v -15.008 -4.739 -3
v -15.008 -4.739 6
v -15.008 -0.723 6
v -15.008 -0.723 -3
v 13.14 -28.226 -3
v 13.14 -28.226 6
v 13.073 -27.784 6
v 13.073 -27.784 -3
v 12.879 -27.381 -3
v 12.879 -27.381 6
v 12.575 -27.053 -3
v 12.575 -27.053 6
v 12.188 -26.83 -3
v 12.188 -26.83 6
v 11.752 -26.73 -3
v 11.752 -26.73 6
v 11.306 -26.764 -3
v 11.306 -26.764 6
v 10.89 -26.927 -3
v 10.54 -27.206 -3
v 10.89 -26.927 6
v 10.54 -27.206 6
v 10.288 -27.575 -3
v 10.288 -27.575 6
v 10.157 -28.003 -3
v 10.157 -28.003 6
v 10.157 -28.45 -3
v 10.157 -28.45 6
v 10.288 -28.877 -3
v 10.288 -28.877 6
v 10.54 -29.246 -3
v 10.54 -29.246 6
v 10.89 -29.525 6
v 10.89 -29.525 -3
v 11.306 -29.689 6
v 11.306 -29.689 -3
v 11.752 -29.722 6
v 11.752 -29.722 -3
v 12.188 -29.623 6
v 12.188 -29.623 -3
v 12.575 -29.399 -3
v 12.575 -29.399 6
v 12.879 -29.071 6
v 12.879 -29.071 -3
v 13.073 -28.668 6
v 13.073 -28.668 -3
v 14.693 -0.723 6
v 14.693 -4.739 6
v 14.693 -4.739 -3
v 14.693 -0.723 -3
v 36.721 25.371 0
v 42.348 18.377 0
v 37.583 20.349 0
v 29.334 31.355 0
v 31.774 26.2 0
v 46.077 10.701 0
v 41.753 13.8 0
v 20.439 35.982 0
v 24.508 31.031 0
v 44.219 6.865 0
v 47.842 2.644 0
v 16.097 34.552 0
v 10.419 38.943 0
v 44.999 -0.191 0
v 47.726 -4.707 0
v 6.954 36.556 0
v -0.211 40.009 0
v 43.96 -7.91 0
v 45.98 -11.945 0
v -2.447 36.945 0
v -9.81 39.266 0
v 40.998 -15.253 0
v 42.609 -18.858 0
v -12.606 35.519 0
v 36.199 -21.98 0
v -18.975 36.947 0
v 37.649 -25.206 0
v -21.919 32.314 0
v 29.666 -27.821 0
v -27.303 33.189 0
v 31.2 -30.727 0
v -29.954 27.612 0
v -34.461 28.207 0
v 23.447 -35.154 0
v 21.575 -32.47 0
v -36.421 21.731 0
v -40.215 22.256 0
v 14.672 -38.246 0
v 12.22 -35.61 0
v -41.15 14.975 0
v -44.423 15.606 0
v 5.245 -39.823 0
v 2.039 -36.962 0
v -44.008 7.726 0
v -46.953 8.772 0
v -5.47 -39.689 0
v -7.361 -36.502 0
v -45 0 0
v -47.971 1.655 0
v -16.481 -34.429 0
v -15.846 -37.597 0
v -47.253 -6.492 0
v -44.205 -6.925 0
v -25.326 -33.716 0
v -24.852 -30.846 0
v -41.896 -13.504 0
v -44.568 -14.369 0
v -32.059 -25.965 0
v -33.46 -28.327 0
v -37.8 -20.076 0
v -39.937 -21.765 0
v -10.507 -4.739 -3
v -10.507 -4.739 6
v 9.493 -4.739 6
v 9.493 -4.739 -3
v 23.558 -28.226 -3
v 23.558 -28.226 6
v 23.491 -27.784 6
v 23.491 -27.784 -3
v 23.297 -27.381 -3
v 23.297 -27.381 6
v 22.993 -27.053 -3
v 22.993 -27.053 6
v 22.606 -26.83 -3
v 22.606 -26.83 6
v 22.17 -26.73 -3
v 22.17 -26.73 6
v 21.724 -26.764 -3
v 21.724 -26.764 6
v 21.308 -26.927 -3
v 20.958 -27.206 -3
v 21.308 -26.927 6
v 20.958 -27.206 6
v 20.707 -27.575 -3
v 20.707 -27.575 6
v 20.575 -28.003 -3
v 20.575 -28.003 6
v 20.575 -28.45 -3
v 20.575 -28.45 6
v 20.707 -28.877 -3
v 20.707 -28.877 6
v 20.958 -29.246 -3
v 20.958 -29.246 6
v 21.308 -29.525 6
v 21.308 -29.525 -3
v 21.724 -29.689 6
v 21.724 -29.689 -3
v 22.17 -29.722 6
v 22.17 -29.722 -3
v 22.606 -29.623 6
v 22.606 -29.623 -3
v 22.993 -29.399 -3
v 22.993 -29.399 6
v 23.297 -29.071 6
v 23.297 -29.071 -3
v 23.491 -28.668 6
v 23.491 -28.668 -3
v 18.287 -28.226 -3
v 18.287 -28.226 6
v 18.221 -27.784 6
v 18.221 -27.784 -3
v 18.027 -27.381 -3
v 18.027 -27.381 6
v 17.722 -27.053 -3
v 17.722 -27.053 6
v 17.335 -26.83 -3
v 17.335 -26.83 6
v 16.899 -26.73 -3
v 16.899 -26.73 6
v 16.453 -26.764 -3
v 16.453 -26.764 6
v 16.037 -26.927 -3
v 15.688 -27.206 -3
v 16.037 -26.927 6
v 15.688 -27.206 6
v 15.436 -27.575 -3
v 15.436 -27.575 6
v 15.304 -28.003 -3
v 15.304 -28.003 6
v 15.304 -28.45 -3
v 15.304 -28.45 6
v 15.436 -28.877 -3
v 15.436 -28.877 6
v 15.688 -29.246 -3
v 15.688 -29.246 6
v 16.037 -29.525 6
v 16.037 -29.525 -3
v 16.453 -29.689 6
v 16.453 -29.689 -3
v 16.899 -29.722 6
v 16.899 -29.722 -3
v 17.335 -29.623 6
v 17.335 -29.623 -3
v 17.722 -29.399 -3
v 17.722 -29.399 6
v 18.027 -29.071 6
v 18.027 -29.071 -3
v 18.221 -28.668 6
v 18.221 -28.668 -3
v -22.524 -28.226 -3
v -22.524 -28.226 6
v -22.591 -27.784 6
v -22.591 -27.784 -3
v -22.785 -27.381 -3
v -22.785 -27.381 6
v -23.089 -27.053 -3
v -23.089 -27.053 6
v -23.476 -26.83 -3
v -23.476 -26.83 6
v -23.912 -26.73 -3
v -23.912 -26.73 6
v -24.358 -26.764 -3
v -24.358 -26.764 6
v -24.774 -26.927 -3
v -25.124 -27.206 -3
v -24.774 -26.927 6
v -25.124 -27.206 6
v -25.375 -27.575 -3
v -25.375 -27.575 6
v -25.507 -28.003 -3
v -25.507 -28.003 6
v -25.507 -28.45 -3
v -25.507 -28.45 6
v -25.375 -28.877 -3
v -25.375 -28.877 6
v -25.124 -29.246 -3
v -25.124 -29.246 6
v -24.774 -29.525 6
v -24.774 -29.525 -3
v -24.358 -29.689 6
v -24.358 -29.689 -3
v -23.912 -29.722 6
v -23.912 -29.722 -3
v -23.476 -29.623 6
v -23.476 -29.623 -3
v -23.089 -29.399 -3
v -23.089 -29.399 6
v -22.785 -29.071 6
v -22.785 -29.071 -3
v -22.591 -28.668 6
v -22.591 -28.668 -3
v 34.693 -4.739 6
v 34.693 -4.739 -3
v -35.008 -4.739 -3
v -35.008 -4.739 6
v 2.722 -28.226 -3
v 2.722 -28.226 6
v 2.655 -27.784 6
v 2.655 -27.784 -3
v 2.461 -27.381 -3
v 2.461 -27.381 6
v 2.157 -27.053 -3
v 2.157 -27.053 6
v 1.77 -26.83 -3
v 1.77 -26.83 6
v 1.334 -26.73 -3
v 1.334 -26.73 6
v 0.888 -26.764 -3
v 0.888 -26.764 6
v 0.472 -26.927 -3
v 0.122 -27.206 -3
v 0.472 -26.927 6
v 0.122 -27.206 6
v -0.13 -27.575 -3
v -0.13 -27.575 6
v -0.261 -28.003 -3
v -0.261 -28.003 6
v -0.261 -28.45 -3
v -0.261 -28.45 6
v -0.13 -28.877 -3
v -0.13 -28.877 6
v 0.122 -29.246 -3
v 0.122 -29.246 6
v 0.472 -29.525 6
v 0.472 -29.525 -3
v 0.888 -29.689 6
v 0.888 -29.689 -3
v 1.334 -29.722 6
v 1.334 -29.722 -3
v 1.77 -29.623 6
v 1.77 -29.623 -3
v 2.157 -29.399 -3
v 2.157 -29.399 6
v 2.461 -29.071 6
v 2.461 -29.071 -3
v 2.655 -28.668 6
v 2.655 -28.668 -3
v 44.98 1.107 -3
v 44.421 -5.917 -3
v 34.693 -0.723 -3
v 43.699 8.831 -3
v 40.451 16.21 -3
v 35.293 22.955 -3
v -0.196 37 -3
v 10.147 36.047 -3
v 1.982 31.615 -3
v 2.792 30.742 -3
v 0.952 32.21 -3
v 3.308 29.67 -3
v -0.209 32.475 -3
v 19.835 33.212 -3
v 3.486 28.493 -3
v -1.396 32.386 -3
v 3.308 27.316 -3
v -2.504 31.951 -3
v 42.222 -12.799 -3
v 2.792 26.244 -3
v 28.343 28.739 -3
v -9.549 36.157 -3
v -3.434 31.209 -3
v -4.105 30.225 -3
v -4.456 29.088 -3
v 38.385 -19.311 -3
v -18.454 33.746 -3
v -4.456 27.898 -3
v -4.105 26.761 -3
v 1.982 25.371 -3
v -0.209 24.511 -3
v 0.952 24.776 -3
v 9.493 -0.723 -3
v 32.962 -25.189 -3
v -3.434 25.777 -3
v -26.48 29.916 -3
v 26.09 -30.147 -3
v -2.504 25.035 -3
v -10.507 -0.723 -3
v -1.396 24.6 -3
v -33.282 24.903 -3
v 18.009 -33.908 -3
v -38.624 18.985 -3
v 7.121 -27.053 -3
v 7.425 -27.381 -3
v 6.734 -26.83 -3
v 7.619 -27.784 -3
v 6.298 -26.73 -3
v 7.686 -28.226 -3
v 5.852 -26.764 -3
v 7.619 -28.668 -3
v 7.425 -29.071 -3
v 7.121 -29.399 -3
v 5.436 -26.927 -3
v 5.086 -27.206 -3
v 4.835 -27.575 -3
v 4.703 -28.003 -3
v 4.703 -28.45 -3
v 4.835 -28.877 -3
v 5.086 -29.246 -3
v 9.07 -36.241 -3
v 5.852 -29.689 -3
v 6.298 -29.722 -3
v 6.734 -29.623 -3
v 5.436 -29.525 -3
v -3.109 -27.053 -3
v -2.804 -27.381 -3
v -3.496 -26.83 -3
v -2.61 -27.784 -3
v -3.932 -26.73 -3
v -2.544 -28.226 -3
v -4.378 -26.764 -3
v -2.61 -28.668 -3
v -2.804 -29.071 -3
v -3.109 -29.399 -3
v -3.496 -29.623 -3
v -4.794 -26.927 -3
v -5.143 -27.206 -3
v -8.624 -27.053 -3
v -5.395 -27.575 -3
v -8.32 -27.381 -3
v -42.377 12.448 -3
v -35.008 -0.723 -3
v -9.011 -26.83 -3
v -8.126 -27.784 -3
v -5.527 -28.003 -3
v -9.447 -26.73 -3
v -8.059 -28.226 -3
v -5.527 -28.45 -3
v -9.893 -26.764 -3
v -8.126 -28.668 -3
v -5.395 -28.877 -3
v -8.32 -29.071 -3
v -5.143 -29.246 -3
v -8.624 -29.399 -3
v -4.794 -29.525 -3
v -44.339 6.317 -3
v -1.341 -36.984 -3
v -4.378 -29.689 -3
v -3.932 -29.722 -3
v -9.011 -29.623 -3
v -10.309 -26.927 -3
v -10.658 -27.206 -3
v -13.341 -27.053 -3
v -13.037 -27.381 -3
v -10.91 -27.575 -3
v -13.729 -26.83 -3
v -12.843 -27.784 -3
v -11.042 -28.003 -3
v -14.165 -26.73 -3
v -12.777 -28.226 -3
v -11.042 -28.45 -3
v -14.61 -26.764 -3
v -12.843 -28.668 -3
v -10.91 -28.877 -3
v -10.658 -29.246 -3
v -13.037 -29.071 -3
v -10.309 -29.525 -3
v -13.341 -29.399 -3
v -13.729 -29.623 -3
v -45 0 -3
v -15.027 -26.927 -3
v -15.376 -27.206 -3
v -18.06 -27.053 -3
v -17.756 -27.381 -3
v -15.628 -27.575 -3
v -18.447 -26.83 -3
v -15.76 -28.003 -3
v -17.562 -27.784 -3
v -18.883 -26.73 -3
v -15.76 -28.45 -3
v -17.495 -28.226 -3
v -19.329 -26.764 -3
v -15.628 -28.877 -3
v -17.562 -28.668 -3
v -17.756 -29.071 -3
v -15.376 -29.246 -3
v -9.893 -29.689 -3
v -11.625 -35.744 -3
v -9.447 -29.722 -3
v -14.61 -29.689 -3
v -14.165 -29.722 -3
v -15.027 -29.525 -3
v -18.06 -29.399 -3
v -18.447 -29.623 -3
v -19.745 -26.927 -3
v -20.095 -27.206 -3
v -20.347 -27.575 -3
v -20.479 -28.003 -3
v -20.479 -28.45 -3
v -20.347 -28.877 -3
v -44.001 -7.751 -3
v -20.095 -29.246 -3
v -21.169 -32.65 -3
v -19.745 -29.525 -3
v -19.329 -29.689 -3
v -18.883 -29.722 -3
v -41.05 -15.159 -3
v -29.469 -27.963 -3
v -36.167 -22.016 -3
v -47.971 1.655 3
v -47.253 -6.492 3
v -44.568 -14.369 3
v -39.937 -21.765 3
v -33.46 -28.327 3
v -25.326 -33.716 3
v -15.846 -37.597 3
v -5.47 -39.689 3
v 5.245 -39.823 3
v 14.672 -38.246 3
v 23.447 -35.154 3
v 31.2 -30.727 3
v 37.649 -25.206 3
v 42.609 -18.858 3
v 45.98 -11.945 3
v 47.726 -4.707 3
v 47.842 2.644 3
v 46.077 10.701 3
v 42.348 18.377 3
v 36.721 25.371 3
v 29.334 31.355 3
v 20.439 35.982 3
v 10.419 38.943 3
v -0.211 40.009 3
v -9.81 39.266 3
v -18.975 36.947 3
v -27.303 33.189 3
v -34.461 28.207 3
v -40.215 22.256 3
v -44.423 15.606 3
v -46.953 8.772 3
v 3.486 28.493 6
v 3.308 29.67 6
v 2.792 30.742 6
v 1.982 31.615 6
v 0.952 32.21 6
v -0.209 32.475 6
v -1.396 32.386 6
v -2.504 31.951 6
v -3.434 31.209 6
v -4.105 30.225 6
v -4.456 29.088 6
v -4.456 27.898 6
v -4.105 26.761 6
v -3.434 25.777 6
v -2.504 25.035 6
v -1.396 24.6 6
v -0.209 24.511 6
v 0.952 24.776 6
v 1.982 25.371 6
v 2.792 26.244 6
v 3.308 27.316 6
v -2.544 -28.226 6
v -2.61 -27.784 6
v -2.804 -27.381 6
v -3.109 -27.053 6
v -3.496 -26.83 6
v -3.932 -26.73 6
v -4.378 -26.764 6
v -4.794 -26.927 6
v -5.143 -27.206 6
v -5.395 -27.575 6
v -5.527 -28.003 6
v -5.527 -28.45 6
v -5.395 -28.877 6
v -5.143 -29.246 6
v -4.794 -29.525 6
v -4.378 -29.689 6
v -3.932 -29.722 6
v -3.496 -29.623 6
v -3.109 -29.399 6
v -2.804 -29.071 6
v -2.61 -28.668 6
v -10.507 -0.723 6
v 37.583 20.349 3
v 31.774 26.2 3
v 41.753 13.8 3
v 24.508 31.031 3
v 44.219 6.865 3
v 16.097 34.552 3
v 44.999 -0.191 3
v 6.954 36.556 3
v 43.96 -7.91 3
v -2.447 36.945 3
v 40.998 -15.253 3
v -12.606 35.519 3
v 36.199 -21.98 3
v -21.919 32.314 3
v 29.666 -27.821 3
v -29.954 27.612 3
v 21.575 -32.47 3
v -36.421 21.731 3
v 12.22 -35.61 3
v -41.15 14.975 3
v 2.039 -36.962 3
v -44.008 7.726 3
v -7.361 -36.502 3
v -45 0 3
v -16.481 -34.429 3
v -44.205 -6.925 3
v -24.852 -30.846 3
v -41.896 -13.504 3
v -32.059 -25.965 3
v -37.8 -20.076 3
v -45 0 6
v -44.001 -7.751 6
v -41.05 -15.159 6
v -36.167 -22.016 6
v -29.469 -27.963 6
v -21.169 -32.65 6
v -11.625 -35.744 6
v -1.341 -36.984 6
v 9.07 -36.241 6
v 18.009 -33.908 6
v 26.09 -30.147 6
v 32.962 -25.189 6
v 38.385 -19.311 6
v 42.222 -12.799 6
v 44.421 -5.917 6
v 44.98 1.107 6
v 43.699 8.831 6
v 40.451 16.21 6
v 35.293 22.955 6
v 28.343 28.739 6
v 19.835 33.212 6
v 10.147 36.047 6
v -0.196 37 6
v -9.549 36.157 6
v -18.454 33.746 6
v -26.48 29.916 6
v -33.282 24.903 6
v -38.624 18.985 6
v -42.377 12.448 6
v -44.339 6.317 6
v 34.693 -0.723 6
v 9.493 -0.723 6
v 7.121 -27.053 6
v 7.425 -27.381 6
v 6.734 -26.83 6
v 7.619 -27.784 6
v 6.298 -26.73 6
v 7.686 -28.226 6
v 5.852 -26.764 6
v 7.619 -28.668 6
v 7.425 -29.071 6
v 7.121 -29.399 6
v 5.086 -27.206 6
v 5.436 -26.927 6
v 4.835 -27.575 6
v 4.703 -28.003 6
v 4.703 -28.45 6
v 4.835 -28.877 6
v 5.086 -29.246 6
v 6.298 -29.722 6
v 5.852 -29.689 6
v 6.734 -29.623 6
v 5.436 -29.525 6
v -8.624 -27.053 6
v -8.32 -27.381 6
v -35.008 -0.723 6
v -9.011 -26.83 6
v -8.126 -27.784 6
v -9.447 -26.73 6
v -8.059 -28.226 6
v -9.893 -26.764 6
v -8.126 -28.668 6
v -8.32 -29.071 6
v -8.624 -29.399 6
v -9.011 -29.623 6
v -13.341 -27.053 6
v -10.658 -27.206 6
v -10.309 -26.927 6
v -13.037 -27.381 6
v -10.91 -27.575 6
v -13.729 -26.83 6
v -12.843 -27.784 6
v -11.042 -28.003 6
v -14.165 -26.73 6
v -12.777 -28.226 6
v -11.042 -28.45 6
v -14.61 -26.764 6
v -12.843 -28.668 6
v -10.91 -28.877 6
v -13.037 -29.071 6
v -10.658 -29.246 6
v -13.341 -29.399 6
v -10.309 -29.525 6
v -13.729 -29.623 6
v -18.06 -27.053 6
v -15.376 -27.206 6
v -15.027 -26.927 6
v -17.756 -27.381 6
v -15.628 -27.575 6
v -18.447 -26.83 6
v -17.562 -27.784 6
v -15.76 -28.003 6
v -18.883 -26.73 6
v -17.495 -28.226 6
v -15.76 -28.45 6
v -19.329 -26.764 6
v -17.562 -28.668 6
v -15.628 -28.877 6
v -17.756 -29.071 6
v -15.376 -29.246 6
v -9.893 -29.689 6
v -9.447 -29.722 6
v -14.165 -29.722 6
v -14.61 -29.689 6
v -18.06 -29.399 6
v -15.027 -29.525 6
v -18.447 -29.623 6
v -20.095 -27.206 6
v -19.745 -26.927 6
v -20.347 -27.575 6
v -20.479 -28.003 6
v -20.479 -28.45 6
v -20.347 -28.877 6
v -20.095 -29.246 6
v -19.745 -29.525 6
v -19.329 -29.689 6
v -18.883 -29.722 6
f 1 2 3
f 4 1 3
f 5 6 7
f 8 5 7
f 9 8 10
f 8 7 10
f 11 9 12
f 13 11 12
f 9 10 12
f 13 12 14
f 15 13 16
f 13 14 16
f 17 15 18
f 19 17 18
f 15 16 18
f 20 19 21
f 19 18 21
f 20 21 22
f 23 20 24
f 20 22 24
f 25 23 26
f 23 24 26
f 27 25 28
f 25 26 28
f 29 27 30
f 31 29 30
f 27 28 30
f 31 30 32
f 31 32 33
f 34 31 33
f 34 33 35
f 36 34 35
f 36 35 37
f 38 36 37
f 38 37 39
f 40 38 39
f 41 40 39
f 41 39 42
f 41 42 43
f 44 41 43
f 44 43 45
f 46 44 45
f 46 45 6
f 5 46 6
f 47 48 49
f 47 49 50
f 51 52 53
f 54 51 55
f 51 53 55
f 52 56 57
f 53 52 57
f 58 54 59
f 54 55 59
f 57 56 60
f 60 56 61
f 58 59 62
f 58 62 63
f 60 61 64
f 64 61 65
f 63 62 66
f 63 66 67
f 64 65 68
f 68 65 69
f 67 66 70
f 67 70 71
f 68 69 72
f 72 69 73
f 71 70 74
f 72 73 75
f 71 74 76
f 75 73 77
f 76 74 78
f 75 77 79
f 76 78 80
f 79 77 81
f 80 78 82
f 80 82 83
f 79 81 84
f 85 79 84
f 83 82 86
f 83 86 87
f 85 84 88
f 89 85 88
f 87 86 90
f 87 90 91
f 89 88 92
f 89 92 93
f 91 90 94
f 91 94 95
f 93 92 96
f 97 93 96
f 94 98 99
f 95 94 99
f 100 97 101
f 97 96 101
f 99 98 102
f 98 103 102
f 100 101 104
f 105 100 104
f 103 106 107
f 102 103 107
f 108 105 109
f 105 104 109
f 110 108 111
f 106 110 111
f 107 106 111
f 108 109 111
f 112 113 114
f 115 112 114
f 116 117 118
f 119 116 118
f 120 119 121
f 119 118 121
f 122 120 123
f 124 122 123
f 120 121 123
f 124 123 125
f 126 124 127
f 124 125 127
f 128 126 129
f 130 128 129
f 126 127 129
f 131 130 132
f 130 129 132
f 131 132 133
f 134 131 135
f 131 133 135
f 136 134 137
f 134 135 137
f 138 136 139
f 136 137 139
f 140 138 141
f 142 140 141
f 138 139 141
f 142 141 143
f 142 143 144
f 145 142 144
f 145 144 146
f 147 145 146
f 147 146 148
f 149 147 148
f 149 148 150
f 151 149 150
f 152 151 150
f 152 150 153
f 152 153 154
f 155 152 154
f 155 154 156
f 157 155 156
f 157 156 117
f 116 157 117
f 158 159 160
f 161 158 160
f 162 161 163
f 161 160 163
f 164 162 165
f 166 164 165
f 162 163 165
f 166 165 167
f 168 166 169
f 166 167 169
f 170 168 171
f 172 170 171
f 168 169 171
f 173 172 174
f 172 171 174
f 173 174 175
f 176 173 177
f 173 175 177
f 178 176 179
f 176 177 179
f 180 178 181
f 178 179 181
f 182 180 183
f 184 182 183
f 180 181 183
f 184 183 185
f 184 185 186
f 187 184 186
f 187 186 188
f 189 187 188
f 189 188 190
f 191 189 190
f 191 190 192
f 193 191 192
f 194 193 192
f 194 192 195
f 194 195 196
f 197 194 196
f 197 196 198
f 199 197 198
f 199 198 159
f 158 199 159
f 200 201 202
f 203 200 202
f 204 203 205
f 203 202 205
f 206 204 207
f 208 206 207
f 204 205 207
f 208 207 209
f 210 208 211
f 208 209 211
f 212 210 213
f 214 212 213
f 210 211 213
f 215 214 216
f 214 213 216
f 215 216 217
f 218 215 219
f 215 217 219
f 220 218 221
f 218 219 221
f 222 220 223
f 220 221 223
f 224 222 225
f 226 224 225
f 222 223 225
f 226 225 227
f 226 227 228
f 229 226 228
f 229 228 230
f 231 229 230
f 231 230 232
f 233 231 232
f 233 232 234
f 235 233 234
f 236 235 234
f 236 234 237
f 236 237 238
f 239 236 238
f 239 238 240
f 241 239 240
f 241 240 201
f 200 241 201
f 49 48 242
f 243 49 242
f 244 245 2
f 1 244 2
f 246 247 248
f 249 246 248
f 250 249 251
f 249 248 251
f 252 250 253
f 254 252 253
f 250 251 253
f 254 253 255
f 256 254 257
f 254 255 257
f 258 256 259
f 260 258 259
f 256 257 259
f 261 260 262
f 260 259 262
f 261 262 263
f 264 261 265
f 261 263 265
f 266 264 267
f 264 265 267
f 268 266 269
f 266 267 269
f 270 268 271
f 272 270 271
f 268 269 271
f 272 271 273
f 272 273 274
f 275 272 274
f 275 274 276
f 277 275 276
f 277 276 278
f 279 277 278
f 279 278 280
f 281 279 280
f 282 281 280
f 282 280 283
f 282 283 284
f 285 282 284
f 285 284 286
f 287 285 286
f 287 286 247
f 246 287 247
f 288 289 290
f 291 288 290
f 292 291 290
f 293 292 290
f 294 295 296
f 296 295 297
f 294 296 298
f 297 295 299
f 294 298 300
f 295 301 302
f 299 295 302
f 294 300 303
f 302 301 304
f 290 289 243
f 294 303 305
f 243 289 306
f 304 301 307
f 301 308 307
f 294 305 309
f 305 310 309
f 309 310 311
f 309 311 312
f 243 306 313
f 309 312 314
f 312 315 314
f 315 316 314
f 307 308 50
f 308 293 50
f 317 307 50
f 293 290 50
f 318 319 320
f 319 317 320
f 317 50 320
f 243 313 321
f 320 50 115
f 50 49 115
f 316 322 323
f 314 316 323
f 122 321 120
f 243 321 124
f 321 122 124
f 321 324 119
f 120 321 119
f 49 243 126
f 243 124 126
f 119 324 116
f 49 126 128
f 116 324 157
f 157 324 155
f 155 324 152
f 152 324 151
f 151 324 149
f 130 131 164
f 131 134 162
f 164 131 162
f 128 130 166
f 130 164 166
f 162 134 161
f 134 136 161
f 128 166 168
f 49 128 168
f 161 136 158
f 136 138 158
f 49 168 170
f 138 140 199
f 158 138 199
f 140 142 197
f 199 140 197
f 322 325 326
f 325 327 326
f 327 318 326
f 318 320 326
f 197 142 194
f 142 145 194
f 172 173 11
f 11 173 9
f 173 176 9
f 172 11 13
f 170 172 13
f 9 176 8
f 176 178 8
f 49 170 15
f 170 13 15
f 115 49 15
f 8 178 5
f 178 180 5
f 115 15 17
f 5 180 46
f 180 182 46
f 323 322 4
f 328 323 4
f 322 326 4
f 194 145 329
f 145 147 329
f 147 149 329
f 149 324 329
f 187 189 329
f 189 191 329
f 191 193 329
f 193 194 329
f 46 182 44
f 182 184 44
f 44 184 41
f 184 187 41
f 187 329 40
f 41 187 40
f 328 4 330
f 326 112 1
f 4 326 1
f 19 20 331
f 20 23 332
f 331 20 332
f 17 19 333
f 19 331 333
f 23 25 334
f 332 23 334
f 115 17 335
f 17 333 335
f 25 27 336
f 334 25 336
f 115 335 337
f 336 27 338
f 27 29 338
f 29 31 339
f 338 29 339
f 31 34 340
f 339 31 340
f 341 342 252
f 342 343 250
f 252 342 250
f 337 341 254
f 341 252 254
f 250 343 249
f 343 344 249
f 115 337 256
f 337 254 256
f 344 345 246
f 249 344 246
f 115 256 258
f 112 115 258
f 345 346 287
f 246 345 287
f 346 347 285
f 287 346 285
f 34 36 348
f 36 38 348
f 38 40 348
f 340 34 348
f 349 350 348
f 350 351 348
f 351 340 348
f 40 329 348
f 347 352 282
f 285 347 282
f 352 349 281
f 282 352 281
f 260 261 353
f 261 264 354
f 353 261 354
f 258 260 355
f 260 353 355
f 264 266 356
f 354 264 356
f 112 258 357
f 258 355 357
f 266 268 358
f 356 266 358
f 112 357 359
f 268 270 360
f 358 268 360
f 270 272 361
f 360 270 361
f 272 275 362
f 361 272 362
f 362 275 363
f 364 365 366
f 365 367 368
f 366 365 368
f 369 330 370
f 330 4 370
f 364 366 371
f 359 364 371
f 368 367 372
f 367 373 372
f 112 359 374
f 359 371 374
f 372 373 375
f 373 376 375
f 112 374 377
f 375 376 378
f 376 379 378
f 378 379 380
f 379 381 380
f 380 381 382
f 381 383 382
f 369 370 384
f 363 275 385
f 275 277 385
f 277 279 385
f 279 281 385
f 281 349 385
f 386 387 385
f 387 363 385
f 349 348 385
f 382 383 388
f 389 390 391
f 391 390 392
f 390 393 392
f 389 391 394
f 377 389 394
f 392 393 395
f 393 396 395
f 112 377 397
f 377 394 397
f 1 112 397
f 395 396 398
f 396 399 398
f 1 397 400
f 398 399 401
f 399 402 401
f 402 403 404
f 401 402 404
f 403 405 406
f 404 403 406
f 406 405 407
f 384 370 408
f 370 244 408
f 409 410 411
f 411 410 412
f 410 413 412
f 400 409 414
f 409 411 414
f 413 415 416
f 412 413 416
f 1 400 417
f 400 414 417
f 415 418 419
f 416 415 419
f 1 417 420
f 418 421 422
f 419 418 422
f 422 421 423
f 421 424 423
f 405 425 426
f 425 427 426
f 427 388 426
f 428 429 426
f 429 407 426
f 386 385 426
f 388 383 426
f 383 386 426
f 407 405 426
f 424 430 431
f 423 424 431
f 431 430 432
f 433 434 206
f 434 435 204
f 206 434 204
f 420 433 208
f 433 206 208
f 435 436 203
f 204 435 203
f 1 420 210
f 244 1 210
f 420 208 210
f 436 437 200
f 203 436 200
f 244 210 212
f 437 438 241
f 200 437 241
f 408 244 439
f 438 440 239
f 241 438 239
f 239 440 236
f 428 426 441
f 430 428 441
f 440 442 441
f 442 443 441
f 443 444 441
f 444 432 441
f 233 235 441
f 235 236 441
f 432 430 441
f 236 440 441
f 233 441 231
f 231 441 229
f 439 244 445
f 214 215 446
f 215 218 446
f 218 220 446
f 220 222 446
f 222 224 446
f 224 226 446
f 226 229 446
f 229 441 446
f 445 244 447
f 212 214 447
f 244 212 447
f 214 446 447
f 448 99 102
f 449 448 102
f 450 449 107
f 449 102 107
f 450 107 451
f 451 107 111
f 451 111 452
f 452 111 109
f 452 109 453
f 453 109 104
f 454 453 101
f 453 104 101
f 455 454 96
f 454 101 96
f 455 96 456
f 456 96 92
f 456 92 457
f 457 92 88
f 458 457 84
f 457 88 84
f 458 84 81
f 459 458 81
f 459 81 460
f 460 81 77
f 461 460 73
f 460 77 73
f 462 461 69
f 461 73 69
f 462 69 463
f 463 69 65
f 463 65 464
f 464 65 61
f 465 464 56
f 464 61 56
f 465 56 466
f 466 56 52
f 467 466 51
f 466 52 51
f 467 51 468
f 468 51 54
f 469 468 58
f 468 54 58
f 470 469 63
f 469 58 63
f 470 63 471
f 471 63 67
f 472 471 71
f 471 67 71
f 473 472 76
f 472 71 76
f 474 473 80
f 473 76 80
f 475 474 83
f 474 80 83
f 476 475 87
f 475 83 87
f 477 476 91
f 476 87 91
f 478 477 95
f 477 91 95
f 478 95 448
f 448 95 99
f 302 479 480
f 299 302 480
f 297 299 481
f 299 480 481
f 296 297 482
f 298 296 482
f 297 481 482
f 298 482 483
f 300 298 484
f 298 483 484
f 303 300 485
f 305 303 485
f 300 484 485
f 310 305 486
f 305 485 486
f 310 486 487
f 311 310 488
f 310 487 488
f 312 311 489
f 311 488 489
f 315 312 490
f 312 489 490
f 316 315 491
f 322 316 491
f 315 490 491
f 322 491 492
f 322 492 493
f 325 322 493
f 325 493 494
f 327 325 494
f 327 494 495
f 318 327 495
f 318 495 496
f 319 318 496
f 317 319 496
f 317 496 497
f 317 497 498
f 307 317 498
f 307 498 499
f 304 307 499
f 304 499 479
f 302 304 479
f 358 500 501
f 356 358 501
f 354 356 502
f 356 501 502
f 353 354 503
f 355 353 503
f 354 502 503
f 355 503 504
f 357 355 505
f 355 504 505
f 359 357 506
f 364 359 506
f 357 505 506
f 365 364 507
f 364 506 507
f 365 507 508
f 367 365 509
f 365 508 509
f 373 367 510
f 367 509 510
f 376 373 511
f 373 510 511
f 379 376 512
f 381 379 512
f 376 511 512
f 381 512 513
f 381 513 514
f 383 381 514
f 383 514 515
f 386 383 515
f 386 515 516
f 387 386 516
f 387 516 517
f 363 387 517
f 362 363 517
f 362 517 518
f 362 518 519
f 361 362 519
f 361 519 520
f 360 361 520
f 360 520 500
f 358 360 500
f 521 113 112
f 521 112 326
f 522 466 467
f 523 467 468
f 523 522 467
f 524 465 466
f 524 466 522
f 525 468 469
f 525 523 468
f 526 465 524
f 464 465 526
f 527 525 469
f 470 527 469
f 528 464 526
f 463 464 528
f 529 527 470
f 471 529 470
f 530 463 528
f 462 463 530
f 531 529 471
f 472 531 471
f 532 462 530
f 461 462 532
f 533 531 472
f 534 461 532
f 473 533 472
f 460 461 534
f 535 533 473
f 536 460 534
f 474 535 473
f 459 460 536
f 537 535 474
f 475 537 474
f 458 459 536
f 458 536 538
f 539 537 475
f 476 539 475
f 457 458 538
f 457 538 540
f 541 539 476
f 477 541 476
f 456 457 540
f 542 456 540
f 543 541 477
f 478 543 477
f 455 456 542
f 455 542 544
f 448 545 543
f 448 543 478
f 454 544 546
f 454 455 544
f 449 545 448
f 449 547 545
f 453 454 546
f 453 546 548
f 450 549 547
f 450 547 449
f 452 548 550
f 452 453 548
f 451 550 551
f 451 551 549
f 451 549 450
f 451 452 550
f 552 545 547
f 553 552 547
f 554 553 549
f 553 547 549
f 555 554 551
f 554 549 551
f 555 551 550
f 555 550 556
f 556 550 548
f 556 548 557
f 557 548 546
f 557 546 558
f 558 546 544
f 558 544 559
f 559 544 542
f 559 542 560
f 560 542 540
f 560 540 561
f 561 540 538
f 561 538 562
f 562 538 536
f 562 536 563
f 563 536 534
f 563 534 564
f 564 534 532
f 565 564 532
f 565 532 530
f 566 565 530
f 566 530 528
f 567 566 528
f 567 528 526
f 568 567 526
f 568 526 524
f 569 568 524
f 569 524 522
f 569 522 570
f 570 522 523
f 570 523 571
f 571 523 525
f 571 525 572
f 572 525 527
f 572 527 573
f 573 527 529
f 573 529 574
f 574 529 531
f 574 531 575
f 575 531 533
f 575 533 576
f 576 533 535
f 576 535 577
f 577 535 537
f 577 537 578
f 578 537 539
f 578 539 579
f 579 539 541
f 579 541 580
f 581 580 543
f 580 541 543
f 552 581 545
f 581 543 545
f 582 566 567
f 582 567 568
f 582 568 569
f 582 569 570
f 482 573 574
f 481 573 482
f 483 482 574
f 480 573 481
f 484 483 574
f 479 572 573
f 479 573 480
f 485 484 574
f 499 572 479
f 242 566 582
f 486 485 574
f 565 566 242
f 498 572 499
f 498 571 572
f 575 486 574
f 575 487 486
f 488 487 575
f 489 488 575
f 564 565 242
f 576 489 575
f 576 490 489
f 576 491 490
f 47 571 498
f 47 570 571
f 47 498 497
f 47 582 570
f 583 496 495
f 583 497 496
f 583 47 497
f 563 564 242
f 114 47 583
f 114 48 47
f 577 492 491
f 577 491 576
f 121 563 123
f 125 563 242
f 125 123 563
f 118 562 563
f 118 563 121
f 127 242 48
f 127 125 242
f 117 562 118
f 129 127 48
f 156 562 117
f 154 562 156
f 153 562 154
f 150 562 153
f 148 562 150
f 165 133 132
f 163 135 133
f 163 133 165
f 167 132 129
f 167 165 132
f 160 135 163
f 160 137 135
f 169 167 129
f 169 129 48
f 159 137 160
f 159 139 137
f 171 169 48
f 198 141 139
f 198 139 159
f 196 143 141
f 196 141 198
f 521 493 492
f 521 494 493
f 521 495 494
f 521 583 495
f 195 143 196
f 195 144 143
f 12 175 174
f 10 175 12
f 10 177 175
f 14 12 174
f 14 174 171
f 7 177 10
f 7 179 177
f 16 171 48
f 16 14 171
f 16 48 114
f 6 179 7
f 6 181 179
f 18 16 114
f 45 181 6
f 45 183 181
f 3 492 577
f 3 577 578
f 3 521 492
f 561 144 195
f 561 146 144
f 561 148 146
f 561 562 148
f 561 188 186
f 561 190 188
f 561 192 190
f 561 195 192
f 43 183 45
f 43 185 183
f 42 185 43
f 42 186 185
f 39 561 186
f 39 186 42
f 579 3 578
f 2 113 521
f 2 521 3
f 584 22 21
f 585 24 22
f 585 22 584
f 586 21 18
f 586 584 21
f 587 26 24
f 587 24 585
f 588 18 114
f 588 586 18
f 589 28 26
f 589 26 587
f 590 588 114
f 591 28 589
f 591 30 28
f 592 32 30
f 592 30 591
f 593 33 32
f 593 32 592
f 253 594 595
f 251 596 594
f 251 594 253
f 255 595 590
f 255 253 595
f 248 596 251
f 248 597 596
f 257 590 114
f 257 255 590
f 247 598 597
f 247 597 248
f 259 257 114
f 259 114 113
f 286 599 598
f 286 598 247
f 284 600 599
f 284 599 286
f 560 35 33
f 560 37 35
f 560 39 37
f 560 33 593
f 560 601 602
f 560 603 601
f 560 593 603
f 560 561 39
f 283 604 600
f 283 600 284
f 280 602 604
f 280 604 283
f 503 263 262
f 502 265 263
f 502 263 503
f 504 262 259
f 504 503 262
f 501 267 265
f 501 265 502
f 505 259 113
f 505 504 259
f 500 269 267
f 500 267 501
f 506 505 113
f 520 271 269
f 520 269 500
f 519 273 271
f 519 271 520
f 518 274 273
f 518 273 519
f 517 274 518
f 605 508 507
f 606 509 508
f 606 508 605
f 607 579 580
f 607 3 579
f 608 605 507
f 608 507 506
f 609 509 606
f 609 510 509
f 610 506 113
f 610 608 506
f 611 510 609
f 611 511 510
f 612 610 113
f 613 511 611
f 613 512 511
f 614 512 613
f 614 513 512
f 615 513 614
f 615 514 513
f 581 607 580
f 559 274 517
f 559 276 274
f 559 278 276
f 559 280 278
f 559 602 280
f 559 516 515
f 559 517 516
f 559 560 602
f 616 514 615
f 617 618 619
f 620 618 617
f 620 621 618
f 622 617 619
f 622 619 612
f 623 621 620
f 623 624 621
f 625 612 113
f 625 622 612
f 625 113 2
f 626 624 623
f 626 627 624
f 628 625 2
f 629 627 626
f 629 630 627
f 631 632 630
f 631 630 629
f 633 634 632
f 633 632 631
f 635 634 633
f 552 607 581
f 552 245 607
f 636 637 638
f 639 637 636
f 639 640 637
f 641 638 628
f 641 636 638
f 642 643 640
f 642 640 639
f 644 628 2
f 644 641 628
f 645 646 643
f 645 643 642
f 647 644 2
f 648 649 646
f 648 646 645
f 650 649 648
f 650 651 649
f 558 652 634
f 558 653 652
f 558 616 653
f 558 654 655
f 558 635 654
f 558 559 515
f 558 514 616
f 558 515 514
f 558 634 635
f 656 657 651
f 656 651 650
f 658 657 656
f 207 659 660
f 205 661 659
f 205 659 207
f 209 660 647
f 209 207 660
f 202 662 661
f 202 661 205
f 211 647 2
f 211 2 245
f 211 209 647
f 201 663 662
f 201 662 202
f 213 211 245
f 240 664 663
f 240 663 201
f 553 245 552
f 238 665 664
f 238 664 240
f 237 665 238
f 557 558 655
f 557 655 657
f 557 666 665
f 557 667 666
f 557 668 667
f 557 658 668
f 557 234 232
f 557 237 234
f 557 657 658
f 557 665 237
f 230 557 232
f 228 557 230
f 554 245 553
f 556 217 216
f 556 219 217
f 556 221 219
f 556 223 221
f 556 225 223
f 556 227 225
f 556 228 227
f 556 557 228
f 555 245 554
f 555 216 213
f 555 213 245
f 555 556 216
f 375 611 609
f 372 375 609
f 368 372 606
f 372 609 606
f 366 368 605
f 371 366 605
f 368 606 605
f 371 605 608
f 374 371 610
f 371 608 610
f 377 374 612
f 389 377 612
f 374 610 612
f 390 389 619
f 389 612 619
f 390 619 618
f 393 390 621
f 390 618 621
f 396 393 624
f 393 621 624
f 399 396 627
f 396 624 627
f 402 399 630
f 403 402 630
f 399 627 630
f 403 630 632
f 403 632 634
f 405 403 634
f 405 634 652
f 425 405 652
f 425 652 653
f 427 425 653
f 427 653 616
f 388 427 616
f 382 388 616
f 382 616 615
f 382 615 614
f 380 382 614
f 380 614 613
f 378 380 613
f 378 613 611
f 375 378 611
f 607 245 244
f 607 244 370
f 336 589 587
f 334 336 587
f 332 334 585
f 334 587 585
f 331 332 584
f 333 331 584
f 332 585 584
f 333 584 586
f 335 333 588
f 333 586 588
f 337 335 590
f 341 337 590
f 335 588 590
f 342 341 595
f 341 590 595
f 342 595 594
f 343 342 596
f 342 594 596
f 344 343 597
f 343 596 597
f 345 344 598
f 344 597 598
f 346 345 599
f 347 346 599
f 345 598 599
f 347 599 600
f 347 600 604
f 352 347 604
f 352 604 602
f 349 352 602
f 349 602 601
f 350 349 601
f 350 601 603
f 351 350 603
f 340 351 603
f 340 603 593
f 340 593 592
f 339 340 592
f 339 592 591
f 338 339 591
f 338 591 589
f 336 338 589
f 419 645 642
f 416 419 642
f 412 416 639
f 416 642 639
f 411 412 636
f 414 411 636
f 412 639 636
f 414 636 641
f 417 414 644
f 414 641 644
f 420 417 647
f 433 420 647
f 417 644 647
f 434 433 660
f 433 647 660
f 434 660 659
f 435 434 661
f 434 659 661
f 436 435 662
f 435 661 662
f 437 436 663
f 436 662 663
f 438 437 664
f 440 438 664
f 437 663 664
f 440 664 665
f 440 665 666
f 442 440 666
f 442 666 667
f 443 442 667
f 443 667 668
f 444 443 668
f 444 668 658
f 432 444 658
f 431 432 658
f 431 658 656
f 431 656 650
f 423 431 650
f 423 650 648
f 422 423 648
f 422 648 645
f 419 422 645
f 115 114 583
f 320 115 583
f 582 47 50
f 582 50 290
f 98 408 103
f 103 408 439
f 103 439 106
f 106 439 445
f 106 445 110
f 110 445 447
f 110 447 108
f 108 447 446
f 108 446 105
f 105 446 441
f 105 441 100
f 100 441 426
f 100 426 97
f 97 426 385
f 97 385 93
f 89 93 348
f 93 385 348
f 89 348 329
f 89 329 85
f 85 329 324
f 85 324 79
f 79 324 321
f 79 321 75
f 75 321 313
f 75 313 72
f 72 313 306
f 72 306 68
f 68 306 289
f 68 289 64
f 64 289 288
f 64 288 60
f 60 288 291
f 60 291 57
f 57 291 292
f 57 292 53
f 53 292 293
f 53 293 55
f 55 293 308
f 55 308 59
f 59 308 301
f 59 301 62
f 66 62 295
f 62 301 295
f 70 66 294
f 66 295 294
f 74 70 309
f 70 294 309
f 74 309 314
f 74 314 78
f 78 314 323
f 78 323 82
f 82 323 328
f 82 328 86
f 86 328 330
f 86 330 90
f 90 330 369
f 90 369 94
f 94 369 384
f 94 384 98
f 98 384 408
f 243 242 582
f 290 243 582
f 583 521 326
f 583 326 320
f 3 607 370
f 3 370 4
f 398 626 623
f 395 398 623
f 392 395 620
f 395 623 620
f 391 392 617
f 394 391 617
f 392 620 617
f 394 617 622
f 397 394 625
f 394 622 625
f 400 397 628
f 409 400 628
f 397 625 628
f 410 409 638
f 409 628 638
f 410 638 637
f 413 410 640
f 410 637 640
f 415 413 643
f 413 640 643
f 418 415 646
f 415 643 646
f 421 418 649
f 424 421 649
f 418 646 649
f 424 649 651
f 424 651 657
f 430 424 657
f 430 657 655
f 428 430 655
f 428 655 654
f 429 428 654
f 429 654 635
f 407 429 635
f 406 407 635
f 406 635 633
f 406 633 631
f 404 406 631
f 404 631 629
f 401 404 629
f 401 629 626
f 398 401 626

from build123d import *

# Parameters (mm, degrees)
SKETCH1_RX               = 48
SKETCH1_RY               = 40
BOSS_EXTRUDE1_DEPTH      = 3
BOSS_EXTRUDE2_DEPTH      = 3
BOSS_EXTRUDE2_DEPTH_BACK = 6
SKETCH2_RX               = 45
SKETCH2_RY               = 37
SKETCH4_R                = 1.5
SKETCH4_R_2              = 3.992919847
SKETCH4_W                = 20
SKETCH4_H                = 4.015498802
CUT_EXTRUDE1_DEPTH       = 14


with BuildPart() as part:
    # Sketch1 → Boss-Extrude1 (new body)
    with BuildSketch(Plane.XY):
        with Locations(Location((0, 0), (0, 0, 178.024329661))):
            Ellipse(SKETCH1_RX, SKETCH1_RY)
    extrude(amount=BOSS_EXTRUDE1_DEPTH)

    # Sketch2 → Boss-Extrude2 (add, two sides: drawn at the far end of the back side and taken through both)
    with BuildSketch(Plane.XY.offset(3).offset(-BOSS_EXTRUDE2_DEPTH_BACK)):
        with Locations(Location((0, 0), (0, 0, 180))):
            Ellipse(SKETCH2_RX, SKETCH2_RY)
    extrude(amount=BOSS_EXTRUDE2_DEPTH + BOSS_EXTRUDE2_DEPTH_BACK)

    # Sketch4 → Cut-Extrude1 (cut)
    with BuildSketch(Plane.XY.offset(6)):
        with Locations((22.058053454, -28.226221002)):
            Circle(SKETCH4_R)
        with Locations((16.787148935, -28.226221002)):
            Circle(SKETCH4_R)
        with Locations((11.639910332, -28.226221002)):
            Circle(SKETCH4_R)
        with Locations((6.186040487, -28.226221002)):
            Circle(SKETCH4_R)
        with Locations((1.221767211, -28.226221002)):
            Circle(SKETCH4_R)
        with Locations((-4.043788707, -28.226221002)):
            Circle(SKETCH4_R)
        with Locations((-9.558860428, -28.226221002)):
            Circle(SKETCH4_R)
        with Locations((-14.276714459, -28.226221002)):
            Circle(SKETCH4_R)
        with Locations((-18.995344935, -28.226221002)):
            Circle(SKETCH4_R)
        with Locations((-24.023984717, -28.226221002)):
            Circle(SKETCH4_R)
        with Locations((-0.507231803, 28.493006682)):
            Circle(SKETCH4_R_2)
        with Locations((24.692949171, -2.731214522)):
            Rectangle(SKETCH4_W, SKETCH4_H)
        with Locations((-0.507231803, -2.731214522)):
            Rectangle(SKETCH4_W, SKETCH4_H)
        with Locations((-25.007748312, -2.731214522)):
            Rectangle(SKETCH4_W, SKETCH4_H)
    extrude(amount=-CUT_EXTRUDE1_DEPTH, mode=Mode.SUBTRACT)


solid = part.part
